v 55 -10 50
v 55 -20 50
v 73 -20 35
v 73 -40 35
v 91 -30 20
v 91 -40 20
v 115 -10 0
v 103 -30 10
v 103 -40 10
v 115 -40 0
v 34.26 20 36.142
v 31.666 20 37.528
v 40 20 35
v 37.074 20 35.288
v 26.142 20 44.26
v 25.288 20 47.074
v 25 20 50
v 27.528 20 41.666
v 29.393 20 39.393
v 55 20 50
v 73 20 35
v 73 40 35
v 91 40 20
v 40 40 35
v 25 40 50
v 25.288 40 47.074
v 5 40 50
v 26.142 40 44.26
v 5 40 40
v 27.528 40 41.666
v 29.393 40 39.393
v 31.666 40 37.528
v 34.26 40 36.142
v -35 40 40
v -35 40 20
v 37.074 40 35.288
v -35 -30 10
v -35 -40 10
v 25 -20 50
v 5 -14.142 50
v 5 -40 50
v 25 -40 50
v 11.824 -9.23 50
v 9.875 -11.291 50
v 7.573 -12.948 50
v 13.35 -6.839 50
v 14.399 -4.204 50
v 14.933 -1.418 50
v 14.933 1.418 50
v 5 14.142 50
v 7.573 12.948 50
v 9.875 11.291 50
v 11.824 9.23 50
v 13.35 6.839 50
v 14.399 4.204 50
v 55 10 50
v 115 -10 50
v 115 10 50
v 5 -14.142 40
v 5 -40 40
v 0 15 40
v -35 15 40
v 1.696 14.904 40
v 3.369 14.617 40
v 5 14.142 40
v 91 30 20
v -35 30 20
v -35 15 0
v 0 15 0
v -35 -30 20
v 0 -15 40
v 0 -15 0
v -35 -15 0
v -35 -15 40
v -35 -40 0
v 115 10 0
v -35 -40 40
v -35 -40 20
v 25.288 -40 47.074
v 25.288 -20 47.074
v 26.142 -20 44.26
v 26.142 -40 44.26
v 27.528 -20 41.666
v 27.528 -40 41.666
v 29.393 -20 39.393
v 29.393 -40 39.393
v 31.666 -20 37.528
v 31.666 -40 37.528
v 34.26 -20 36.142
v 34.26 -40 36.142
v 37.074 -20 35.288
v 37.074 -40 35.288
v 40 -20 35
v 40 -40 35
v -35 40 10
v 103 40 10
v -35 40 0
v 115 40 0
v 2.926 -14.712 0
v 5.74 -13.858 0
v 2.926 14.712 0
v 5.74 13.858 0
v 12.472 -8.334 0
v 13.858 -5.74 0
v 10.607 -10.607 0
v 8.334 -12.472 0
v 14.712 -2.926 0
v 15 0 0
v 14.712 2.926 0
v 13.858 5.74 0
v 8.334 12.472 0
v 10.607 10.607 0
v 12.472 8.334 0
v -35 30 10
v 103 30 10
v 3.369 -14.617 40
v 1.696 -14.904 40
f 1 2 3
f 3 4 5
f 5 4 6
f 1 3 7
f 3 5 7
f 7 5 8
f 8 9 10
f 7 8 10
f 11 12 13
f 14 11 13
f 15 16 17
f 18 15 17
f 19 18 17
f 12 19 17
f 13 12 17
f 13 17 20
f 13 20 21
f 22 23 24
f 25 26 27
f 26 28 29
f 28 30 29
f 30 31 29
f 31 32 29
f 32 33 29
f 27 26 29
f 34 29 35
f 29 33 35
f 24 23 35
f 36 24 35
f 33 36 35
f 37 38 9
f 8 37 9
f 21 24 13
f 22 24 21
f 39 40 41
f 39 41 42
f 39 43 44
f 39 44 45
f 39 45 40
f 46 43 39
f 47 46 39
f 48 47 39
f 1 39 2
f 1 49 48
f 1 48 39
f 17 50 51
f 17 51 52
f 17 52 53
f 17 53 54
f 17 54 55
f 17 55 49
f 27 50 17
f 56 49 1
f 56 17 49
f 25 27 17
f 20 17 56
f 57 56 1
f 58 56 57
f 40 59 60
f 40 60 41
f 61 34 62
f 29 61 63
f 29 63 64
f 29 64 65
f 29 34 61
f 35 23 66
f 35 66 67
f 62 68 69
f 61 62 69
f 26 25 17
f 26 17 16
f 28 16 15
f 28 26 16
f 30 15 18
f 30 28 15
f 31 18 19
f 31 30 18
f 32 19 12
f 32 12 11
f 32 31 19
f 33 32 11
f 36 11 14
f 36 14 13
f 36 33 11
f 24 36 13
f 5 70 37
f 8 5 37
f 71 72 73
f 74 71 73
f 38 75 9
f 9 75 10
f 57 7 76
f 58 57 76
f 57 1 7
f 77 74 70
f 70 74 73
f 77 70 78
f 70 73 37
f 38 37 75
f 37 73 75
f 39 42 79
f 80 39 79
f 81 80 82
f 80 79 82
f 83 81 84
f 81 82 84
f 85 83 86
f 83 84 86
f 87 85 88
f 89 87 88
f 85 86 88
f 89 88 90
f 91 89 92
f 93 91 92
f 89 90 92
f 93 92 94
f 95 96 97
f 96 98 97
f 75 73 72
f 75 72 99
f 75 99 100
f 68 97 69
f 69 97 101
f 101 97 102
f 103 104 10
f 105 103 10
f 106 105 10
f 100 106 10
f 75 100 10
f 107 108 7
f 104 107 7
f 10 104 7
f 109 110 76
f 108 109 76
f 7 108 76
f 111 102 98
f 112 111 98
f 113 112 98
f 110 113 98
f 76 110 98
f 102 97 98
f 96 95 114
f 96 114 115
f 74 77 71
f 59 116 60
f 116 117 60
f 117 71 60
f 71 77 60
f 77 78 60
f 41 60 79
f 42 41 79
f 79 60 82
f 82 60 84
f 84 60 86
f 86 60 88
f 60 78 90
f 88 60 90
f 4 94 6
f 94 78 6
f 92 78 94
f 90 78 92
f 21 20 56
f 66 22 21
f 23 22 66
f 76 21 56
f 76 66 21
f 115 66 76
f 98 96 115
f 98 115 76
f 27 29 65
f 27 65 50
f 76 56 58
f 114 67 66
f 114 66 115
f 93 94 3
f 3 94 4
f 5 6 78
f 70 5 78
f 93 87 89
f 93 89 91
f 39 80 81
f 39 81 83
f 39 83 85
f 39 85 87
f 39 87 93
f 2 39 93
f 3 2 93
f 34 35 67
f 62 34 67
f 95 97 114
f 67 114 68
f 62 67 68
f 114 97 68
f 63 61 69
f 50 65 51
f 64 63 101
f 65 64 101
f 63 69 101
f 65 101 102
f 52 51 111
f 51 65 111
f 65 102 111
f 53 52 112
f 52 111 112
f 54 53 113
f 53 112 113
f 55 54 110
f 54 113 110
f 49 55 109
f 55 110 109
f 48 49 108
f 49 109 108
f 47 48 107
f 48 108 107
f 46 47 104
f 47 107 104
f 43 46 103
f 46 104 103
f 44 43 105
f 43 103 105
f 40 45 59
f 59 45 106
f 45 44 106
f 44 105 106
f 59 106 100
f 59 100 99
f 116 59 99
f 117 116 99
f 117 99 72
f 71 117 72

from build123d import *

# Parameters (mm, degrees)
F1_DEPTH = 50
F2_W     = 40
F2_H     = 10
F3_DEPTH = 30
F4_DEPTH = 10
F5_DEPTH = 20


# Not quite as in the source:
# - a pattern or mirror of a feature is missing from the dataset's text; its kind, count and spacing are read off the source's solid


with BuildPart() as f1:
    # F0 (on Top) → F1 (new body)
    with BuildSketch(Plane.XY):
        with BuildLine():
            Line((-35, -15), (-35, -40))
            Line((-35, -40), (115, -40))
            Line((115, -40), (115, 40))
            Line((115, 40), (-35, 40))
            Line((-35, 40), (-35, 15))
            Line((-35, 15), (0, 15))
            ThreePointArc((0, 15), (15, 0), (0, -15))
            Line((0, -15), (-35, -15))
        make_face()
    extrude(amount=F1_DEPTH)

    # F2 (on face) → F3 (cut)
    with BuildSketch(Plane.XZ.offset(40)):
        with Locations((-15, 45)):
            Rectangle(F2_W, F2_H)
        Polygon((115, 50), (55, 50), (73, 35), (91, 20), (103, 10), (115, 0), align=None)
    f3 = extrude(amount=-F3_DEPTH, mode=Mode.SUBTRACT)

    # F3_copies: F3 across plane
    add(f3.mirror(Plane.ZX), mode=Mode.SUBTRACT)

    # F2 (on face) → F4 (cut)
    with BuildSketch(Plane.XZ.offset(40)):
        Polygon((91, 20), (-35, 20), (-35, 10), (103, 10), align=None)
    f4 = extrude(amount=-F4_DEPTH, mode=Mode.SUBTRACT)

    # F4_copies: F4 across plane
    add(f4.mirror(Plane.ZX), mode=Mode.SUBTRACT)

    # F2 (on face) → F5 (cut)
    with BuildSketch(Plane.XZ.offset(40)):
        with BuildLine():
            Line((55, 50), (25, 50))
            ThreePointArc((25, 50), (29.3933982822, 39.3933982822), (40, 35))
            Line((40, 35), (73, 35))
            Line((73, 35), (55, 50))
        make_face()
    f5 = extrude(amount=-F5_DEPTH, mode=Mode.SUBTRACT)

    # F5_copies: F5 across plane
    add(f5.mirror(Plane.ZX), mode=Mode.SUBTRACT)


solid = f1.part
